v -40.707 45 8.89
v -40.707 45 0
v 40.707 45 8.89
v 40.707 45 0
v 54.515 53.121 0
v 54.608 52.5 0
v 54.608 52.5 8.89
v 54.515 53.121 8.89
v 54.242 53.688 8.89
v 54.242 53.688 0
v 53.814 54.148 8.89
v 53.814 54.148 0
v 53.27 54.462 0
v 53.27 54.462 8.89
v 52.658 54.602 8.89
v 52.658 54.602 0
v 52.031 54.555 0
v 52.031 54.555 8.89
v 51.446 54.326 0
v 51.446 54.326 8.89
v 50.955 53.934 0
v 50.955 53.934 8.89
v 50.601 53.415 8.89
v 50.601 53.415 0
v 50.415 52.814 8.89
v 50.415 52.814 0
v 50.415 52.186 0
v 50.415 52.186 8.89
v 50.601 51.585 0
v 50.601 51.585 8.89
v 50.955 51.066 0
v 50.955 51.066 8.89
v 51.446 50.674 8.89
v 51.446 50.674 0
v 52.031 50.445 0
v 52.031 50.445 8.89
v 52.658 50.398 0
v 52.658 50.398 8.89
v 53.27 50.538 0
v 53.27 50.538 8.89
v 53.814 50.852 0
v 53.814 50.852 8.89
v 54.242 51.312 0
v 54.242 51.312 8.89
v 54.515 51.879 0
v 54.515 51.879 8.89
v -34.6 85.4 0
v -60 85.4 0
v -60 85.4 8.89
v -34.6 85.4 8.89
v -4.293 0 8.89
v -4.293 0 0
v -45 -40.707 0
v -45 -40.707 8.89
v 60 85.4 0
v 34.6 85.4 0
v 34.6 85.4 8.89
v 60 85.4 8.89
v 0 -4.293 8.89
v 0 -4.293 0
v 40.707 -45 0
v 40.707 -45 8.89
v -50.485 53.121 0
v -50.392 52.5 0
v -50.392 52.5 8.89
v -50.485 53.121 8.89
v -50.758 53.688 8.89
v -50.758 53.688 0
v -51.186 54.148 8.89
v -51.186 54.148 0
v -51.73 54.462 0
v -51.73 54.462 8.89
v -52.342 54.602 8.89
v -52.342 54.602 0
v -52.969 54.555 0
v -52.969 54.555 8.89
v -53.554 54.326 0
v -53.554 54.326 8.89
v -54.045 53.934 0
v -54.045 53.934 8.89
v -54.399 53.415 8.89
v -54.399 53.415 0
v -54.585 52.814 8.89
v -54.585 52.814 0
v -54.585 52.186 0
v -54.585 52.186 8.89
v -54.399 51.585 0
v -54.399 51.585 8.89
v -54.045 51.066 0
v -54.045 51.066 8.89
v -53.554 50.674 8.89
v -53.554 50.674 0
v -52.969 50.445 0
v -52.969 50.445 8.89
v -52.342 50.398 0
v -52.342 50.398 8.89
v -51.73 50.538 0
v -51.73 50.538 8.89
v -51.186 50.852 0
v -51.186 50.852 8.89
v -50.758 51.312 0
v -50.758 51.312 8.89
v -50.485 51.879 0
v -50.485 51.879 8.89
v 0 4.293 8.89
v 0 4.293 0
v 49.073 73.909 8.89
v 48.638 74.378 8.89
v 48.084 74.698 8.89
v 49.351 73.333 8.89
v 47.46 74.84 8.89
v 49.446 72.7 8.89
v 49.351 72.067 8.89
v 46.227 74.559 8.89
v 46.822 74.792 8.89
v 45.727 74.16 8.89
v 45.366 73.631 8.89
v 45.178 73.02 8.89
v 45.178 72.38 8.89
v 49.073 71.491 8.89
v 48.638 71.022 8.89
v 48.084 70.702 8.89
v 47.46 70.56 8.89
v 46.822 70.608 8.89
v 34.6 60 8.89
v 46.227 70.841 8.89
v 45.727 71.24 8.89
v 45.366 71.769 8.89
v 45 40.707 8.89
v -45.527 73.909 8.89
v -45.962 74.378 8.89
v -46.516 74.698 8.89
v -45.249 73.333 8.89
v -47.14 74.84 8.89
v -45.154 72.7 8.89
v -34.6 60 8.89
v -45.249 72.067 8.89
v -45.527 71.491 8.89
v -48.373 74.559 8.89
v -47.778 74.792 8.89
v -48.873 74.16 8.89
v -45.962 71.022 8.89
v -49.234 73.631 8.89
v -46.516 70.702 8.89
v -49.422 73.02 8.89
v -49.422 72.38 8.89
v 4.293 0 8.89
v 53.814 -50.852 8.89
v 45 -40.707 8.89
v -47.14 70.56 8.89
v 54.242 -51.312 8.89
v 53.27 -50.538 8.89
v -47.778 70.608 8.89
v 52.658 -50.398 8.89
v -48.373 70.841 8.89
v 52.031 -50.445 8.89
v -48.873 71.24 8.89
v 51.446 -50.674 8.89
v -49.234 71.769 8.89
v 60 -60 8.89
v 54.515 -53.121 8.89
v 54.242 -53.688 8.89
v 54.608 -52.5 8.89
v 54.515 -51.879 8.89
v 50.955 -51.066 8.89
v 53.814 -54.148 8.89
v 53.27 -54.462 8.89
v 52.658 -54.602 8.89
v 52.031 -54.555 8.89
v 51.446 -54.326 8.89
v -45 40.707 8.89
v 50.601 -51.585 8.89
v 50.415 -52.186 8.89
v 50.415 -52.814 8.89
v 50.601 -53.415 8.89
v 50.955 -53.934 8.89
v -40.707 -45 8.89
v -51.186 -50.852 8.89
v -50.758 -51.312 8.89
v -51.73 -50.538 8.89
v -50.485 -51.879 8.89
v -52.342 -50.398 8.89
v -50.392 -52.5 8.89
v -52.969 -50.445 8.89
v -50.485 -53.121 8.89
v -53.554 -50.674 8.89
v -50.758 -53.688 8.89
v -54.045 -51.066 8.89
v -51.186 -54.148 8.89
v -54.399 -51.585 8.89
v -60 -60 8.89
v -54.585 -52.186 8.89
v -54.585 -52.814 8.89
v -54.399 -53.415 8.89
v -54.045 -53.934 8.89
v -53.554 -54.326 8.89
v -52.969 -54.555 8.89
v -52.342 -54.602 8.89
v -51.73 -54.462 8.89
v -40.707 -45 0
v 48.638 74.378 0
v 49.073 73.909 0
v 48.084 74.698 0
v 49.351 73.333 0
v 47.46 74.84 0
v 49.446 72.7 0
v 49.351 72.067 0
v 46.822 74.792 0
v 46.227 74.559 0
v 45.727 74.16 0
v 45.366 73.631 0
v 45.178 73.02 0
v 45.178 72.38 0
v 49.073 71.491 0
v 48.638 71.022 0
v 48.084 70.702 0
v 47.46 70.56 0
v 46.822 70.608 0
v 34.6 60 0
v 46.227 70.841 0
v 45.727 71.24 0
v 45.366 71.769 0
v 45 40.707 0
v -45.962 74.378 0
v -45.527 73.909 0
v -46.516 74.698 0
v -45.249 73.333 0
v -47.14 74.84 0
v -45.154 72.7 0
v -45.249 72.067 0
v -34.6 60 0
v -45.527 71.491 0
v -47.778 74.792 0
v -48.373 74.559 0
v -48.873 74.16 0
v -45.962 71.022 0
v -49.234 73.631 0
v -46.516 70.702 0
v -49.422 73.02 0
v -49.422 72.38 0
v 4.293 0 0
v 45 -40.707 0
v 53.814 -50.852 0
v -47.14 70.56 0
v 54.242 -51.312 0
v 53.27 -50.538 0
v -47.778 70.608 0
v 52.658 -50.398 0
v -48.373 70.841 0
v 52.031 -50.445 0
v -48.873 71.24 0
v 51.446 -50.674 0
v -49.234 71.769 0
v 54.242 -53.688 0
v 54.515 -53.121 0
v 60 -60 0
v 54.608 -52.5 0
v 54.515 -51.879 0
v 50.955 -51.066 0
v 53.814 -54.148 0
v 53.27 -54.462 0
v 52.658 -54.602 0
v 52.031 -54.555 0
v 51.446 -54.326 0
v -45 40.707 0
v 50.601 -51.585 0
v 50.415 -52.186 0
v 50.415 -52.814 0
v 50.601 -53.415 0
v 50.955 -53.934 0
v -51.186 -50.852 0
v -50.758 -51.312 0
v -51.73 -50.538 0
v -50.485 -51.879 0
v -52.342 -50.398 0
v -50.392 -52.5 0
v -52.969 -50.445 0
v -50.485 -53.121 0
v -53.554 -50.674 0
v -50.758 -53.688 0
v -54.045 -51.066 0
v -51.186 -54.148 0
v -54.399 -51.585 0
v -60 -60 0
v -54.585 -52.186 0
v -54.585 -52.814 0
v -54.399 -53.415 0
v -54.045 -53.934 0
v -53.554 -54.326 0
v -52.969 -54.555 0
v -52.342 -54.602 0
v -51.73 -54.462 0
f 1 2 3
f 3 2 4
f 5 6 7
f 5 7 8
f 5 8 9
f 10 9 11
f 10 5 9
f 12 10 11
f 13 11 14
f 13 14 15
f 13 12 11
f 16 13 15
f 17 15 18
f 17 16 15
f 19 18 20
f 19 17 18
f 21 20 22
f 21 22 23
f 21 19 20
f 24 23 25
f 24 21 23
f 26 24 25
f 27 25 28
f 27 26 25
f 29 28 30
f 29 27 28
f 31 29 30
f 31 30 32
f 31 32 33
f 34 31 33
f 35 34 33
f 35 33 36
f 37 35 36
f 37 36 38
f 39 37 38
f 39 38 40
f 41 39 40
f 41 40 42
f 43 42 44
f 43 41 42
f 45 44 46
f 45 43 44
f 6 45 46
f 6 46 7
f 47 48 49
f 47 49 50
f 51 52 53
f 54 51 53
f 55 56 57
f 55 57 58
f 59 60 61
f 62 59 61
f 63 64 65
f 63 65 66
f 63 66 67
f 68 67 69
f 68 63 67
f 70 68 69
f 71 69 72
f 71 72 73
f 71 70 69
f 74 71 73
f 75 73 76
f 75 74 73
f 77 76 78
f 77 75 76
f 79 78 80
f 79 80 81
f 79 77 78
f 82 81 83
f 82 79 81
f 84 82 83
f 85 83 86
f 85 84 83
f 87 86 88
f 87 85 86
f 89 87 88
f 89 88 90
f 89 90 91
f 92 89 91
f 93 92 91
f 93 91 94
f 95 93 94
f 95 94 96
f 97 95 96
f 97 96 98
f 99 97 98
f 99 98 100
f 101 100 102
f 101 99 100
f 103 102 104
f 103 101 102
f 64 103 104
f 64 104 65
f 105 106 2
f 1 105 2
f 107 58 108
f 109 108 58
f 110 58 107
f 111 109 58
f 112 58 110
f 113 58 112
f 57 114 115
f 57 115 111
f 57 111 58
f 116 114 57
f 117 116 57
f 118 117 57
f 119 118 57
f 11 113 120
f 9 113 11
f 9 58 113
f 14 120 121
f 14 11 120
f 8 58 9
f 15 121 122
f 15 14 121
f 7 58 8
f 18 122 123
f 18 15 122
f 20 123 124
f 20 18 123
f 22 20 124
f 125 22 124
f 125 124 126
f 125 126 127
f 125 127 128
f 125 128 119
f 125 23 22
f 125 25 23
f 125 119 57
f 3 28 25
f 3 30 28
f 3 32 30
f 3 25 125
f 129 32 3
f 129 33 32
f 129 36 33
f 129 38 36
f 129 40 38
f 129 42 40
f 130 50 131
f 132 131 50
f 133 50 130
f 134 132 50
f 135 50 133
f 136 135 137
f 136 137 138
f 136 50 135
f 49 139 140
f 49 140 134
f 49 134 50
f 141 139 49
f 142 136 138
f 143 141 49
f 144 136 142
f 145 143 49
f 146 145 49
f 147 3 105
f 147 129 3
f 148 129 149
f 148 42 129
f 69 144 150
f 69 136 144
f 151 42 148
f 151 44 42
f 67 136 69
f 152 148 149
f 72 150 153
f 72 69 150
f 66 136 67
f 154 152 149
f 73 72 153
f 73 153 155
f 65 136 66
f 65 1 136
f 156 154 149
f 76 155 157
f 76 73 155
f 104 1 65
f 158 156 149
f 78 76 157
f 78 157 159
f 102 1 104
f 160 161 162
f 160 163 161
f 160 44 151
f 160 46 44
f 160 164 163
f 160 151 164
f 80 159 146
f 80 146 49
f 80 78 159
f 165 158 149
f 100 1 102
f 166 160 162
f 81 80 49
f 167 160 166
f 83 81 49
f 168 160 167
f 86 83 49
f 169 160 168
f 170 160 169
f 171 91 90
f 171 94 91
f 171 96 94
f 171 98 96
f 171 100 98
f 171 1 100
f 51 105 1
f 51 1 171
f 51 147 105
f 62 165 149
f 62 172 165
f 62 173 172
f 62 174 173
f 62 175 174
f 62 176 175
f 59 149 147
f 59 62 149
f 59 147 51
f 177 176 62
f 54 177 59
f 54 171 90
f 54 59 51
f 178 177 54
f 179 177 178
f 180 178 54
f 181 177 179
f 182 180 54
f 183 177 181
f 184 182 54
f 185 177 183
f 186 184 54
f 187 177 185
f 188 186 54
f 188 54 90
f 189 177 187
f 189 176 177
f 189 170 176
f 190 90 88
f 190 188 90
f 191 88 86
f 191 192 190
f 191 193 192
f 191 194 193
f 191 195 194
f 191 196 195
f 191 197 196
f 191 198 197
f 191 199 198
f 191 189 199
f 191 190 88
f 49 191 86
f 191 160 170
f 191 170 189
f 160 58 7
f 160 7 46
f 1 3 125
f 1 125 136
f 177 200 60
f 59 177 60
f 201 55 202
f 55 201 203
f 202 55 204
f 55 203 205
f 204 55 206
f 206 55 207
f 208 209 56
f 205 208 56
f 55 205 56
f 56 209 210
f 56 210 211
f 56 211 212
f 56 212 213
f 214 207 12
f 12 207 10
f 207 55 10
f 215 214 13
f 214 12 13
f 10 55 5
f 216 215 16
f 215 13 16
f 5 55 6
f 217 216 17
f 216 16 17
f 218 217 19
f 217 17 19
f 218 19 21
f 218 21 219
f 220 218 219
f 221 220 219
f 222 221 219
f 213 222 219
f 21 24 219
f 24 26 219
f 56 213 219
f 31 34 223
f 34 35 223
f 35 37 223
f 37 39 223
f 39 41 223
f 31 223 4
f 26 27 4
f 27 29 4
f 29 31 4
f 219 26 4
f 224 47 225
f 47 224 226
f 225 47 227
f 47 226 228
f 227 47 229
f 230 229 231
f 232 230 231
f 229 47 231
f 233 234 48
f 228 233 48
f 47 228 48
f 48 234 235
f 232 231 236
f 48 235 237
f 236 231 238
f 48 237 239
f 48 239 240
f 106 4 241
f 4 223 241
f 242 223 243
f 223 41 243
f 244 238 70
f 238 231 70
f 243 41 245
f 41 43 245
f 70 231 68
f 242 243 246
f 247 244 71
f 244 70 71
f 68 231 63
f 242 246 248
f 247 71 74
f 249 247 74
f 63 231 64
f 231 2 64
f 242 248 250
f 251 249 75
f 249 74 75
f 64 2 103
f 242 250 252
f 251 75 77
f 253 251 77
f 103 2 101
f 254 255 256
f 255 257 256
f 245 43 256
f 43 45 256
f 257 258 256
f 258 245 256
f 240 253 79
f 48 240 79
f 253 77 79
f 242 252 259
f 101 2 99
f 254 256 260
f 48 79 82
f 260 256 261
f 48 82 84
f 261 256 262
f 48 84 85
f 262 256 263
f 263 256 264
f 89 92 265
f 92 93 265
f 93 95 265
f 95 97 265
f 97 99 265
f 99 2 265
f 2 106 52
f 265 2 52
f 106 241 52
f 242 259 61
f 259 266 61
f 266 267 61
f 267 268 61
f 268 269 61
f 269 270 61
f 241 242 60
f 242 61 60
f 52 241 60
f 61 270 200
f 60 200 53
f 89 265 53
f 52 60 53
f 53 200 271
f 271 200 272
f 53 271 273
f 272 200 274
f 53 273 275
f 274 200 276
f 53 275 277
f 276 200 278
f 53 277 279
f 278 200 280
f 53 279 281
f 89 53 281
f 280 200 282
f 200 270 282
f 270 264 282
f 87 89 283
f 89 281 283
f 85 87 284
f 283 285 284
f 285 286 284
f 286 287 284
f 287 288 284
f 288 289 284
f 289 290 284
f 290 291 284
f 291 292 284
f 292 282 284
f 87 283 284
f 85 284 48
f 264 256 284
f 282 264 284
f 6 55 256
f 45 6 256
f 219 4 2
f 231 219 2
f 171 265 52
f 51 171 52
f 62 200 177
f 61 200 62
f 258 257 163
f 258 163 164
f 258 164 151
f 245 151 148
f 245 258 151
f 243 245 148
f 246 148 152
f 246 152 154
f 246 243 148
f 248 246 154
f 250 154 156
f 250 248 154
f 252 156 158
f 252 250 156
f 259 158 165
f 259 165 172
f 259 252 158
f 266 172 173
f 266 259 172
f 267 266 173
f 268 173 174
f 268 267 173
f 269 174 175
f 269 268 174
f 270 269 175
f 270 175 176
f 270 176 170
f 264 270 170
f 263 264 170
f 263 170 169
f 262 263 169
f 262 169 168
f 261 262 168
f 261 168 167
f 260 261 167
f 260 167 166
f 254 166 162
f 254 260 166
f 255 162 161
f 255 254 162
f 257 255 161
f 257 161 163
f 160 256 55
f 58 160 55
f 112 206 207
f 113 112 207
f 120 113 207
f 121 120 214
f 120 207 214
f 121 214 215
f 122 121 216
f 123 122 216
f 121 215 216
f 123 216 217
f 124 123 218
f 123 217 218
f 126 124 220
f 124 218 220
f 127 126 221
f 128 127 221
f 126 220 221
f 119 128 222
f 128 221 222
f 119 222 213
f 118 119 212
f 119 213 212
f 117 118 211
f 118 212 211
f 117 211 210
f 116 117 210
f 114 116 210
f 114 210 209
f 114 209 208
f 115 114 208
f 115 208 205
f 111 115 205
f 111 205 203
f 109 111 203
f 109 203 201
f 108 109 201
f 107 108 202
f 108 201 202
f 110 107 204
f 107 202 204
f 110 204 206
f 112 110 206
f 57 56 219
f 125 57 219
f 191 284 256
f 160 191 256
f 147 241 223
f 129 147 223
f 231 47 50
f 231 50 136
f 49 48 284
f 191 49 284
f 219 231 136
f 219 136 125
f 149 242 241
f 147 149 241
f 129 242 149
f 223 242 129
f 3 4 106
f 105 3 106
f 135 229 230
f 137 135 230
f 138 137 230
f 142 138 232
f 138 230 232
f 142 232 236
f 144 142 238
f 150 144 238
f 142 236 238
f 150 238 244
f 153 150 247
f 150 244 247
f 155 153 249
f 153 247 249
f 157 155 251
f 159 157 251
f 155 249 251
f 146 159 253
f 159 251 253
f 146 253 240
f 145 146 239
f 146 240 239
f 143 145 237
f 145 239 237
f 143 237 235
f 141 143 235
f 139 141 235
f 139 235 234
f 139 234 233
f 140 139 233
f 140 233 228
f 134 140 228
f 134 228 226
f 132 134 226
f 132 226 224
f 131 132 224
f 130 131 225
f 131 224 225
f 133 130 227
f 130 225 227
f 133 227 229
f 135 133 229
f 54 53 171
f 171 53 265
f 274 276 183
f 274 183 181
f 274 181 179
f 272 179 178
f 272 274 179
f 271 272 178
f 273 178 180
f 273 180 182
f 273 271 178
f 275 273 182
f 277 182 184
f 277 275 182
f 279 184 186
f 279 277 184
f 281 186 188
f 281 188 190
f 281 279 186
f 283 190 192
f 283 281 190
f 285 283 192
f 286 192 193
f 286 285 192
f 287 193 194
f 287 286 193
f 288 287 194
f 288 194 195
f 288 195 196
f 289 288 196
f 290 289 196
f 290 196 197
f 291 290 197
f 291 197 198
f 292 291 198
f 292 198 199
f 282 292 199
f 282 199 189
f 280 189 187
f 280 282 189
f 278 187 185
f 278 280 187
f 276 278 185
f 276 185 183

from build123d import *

# Parameters (mm, degrees)
SKETCH_W     = 120
SKETCH_H     = 120
SKETCH_R     = 2.1082
SKETCH_W_2   = 90
SKETCH_H_2   = 90
PAD_DEPTH    = 8.89
SKETCH001_W  = 25.4
SKETCH001_H  = 25.4
SKETCH001_R  = 2.1463
PAD001_DEPTH = 8.89
PAD002_DEPTH = 8.89


with BuildPart() as part:
    # Sketch → Pad (new body)
    with BuildSketch(Plane.XY):
        Rectangle(SKETCH_W, SKETCH_H)
        with Locations((-52.5, 52.5)):
            Circle(SKETCH_R, mode=Mode.SUBTRACT)
        with Locations((52.5, 52.5)):
            Circle(SKETCH_R, mode=Mode.SUBTRACT)
        with Locations((-52.5, -52.5)):
            Circle(SKETCH_R, mode=Mode.SUBTRACT)
        with Locations((52.5, -52.5)):
            Circle(SKETCH_R, mode=Mode.SUBTRACT)
        Rectangle(SKETCH_W_2, SKETCH_H_2, mode=Mode.SUBTRACT)
    extrude(amount=PAD_DEPTH)

    # Sketch001 (on Face13 of Pad) → Pad001 (join)
    with BuildSketch(Plane(origin=(0, 0, 0), x_dir=(1, 0, 0), z_dir=(0, 0, -1))):
        with Locations((-47.3, -72.7)):
            Rectangle(SKETCH001_W, SKETCH001_H)
        with Locations((-47.3, -72.7)):
            Circle(SKETCH001_R, mode=Mode.SUBTRACT)
        with Locations((47.3, -72.7)):
            Rectangle(SKETCH001_W, SKETCH001_H)
        with Locations((47.3, -72.7)):
            Circle(SKETCH001_R, mode=Mode.SUBTRACT)
    extrude(amount=-PAD001_DEPTH)

    # Sketch002 (on Face2 of Pad001) → Pad002 (join)
    with BuildSketch(Plane(origin=(0, 0, 0), x_dir=(1, 0, 0), z_dir=(0, 0, -1))):
        Polygon((-45, 45), (-40.7074, 45), (0, 4.2926), (40.7074, 45), (45, 45), (45, 40.7074), (4.2926, 0), (45, -40.7074), (45, -45), (40.7074, -45), (0, -4.2926), (-40.7074, -45), (-45, -45), (-45, -40.7074), (-4.2926, 0), (-45, 40.7074), align=None)
    extrude(amount=-PAD002_DEPTH)


solid = part.part
